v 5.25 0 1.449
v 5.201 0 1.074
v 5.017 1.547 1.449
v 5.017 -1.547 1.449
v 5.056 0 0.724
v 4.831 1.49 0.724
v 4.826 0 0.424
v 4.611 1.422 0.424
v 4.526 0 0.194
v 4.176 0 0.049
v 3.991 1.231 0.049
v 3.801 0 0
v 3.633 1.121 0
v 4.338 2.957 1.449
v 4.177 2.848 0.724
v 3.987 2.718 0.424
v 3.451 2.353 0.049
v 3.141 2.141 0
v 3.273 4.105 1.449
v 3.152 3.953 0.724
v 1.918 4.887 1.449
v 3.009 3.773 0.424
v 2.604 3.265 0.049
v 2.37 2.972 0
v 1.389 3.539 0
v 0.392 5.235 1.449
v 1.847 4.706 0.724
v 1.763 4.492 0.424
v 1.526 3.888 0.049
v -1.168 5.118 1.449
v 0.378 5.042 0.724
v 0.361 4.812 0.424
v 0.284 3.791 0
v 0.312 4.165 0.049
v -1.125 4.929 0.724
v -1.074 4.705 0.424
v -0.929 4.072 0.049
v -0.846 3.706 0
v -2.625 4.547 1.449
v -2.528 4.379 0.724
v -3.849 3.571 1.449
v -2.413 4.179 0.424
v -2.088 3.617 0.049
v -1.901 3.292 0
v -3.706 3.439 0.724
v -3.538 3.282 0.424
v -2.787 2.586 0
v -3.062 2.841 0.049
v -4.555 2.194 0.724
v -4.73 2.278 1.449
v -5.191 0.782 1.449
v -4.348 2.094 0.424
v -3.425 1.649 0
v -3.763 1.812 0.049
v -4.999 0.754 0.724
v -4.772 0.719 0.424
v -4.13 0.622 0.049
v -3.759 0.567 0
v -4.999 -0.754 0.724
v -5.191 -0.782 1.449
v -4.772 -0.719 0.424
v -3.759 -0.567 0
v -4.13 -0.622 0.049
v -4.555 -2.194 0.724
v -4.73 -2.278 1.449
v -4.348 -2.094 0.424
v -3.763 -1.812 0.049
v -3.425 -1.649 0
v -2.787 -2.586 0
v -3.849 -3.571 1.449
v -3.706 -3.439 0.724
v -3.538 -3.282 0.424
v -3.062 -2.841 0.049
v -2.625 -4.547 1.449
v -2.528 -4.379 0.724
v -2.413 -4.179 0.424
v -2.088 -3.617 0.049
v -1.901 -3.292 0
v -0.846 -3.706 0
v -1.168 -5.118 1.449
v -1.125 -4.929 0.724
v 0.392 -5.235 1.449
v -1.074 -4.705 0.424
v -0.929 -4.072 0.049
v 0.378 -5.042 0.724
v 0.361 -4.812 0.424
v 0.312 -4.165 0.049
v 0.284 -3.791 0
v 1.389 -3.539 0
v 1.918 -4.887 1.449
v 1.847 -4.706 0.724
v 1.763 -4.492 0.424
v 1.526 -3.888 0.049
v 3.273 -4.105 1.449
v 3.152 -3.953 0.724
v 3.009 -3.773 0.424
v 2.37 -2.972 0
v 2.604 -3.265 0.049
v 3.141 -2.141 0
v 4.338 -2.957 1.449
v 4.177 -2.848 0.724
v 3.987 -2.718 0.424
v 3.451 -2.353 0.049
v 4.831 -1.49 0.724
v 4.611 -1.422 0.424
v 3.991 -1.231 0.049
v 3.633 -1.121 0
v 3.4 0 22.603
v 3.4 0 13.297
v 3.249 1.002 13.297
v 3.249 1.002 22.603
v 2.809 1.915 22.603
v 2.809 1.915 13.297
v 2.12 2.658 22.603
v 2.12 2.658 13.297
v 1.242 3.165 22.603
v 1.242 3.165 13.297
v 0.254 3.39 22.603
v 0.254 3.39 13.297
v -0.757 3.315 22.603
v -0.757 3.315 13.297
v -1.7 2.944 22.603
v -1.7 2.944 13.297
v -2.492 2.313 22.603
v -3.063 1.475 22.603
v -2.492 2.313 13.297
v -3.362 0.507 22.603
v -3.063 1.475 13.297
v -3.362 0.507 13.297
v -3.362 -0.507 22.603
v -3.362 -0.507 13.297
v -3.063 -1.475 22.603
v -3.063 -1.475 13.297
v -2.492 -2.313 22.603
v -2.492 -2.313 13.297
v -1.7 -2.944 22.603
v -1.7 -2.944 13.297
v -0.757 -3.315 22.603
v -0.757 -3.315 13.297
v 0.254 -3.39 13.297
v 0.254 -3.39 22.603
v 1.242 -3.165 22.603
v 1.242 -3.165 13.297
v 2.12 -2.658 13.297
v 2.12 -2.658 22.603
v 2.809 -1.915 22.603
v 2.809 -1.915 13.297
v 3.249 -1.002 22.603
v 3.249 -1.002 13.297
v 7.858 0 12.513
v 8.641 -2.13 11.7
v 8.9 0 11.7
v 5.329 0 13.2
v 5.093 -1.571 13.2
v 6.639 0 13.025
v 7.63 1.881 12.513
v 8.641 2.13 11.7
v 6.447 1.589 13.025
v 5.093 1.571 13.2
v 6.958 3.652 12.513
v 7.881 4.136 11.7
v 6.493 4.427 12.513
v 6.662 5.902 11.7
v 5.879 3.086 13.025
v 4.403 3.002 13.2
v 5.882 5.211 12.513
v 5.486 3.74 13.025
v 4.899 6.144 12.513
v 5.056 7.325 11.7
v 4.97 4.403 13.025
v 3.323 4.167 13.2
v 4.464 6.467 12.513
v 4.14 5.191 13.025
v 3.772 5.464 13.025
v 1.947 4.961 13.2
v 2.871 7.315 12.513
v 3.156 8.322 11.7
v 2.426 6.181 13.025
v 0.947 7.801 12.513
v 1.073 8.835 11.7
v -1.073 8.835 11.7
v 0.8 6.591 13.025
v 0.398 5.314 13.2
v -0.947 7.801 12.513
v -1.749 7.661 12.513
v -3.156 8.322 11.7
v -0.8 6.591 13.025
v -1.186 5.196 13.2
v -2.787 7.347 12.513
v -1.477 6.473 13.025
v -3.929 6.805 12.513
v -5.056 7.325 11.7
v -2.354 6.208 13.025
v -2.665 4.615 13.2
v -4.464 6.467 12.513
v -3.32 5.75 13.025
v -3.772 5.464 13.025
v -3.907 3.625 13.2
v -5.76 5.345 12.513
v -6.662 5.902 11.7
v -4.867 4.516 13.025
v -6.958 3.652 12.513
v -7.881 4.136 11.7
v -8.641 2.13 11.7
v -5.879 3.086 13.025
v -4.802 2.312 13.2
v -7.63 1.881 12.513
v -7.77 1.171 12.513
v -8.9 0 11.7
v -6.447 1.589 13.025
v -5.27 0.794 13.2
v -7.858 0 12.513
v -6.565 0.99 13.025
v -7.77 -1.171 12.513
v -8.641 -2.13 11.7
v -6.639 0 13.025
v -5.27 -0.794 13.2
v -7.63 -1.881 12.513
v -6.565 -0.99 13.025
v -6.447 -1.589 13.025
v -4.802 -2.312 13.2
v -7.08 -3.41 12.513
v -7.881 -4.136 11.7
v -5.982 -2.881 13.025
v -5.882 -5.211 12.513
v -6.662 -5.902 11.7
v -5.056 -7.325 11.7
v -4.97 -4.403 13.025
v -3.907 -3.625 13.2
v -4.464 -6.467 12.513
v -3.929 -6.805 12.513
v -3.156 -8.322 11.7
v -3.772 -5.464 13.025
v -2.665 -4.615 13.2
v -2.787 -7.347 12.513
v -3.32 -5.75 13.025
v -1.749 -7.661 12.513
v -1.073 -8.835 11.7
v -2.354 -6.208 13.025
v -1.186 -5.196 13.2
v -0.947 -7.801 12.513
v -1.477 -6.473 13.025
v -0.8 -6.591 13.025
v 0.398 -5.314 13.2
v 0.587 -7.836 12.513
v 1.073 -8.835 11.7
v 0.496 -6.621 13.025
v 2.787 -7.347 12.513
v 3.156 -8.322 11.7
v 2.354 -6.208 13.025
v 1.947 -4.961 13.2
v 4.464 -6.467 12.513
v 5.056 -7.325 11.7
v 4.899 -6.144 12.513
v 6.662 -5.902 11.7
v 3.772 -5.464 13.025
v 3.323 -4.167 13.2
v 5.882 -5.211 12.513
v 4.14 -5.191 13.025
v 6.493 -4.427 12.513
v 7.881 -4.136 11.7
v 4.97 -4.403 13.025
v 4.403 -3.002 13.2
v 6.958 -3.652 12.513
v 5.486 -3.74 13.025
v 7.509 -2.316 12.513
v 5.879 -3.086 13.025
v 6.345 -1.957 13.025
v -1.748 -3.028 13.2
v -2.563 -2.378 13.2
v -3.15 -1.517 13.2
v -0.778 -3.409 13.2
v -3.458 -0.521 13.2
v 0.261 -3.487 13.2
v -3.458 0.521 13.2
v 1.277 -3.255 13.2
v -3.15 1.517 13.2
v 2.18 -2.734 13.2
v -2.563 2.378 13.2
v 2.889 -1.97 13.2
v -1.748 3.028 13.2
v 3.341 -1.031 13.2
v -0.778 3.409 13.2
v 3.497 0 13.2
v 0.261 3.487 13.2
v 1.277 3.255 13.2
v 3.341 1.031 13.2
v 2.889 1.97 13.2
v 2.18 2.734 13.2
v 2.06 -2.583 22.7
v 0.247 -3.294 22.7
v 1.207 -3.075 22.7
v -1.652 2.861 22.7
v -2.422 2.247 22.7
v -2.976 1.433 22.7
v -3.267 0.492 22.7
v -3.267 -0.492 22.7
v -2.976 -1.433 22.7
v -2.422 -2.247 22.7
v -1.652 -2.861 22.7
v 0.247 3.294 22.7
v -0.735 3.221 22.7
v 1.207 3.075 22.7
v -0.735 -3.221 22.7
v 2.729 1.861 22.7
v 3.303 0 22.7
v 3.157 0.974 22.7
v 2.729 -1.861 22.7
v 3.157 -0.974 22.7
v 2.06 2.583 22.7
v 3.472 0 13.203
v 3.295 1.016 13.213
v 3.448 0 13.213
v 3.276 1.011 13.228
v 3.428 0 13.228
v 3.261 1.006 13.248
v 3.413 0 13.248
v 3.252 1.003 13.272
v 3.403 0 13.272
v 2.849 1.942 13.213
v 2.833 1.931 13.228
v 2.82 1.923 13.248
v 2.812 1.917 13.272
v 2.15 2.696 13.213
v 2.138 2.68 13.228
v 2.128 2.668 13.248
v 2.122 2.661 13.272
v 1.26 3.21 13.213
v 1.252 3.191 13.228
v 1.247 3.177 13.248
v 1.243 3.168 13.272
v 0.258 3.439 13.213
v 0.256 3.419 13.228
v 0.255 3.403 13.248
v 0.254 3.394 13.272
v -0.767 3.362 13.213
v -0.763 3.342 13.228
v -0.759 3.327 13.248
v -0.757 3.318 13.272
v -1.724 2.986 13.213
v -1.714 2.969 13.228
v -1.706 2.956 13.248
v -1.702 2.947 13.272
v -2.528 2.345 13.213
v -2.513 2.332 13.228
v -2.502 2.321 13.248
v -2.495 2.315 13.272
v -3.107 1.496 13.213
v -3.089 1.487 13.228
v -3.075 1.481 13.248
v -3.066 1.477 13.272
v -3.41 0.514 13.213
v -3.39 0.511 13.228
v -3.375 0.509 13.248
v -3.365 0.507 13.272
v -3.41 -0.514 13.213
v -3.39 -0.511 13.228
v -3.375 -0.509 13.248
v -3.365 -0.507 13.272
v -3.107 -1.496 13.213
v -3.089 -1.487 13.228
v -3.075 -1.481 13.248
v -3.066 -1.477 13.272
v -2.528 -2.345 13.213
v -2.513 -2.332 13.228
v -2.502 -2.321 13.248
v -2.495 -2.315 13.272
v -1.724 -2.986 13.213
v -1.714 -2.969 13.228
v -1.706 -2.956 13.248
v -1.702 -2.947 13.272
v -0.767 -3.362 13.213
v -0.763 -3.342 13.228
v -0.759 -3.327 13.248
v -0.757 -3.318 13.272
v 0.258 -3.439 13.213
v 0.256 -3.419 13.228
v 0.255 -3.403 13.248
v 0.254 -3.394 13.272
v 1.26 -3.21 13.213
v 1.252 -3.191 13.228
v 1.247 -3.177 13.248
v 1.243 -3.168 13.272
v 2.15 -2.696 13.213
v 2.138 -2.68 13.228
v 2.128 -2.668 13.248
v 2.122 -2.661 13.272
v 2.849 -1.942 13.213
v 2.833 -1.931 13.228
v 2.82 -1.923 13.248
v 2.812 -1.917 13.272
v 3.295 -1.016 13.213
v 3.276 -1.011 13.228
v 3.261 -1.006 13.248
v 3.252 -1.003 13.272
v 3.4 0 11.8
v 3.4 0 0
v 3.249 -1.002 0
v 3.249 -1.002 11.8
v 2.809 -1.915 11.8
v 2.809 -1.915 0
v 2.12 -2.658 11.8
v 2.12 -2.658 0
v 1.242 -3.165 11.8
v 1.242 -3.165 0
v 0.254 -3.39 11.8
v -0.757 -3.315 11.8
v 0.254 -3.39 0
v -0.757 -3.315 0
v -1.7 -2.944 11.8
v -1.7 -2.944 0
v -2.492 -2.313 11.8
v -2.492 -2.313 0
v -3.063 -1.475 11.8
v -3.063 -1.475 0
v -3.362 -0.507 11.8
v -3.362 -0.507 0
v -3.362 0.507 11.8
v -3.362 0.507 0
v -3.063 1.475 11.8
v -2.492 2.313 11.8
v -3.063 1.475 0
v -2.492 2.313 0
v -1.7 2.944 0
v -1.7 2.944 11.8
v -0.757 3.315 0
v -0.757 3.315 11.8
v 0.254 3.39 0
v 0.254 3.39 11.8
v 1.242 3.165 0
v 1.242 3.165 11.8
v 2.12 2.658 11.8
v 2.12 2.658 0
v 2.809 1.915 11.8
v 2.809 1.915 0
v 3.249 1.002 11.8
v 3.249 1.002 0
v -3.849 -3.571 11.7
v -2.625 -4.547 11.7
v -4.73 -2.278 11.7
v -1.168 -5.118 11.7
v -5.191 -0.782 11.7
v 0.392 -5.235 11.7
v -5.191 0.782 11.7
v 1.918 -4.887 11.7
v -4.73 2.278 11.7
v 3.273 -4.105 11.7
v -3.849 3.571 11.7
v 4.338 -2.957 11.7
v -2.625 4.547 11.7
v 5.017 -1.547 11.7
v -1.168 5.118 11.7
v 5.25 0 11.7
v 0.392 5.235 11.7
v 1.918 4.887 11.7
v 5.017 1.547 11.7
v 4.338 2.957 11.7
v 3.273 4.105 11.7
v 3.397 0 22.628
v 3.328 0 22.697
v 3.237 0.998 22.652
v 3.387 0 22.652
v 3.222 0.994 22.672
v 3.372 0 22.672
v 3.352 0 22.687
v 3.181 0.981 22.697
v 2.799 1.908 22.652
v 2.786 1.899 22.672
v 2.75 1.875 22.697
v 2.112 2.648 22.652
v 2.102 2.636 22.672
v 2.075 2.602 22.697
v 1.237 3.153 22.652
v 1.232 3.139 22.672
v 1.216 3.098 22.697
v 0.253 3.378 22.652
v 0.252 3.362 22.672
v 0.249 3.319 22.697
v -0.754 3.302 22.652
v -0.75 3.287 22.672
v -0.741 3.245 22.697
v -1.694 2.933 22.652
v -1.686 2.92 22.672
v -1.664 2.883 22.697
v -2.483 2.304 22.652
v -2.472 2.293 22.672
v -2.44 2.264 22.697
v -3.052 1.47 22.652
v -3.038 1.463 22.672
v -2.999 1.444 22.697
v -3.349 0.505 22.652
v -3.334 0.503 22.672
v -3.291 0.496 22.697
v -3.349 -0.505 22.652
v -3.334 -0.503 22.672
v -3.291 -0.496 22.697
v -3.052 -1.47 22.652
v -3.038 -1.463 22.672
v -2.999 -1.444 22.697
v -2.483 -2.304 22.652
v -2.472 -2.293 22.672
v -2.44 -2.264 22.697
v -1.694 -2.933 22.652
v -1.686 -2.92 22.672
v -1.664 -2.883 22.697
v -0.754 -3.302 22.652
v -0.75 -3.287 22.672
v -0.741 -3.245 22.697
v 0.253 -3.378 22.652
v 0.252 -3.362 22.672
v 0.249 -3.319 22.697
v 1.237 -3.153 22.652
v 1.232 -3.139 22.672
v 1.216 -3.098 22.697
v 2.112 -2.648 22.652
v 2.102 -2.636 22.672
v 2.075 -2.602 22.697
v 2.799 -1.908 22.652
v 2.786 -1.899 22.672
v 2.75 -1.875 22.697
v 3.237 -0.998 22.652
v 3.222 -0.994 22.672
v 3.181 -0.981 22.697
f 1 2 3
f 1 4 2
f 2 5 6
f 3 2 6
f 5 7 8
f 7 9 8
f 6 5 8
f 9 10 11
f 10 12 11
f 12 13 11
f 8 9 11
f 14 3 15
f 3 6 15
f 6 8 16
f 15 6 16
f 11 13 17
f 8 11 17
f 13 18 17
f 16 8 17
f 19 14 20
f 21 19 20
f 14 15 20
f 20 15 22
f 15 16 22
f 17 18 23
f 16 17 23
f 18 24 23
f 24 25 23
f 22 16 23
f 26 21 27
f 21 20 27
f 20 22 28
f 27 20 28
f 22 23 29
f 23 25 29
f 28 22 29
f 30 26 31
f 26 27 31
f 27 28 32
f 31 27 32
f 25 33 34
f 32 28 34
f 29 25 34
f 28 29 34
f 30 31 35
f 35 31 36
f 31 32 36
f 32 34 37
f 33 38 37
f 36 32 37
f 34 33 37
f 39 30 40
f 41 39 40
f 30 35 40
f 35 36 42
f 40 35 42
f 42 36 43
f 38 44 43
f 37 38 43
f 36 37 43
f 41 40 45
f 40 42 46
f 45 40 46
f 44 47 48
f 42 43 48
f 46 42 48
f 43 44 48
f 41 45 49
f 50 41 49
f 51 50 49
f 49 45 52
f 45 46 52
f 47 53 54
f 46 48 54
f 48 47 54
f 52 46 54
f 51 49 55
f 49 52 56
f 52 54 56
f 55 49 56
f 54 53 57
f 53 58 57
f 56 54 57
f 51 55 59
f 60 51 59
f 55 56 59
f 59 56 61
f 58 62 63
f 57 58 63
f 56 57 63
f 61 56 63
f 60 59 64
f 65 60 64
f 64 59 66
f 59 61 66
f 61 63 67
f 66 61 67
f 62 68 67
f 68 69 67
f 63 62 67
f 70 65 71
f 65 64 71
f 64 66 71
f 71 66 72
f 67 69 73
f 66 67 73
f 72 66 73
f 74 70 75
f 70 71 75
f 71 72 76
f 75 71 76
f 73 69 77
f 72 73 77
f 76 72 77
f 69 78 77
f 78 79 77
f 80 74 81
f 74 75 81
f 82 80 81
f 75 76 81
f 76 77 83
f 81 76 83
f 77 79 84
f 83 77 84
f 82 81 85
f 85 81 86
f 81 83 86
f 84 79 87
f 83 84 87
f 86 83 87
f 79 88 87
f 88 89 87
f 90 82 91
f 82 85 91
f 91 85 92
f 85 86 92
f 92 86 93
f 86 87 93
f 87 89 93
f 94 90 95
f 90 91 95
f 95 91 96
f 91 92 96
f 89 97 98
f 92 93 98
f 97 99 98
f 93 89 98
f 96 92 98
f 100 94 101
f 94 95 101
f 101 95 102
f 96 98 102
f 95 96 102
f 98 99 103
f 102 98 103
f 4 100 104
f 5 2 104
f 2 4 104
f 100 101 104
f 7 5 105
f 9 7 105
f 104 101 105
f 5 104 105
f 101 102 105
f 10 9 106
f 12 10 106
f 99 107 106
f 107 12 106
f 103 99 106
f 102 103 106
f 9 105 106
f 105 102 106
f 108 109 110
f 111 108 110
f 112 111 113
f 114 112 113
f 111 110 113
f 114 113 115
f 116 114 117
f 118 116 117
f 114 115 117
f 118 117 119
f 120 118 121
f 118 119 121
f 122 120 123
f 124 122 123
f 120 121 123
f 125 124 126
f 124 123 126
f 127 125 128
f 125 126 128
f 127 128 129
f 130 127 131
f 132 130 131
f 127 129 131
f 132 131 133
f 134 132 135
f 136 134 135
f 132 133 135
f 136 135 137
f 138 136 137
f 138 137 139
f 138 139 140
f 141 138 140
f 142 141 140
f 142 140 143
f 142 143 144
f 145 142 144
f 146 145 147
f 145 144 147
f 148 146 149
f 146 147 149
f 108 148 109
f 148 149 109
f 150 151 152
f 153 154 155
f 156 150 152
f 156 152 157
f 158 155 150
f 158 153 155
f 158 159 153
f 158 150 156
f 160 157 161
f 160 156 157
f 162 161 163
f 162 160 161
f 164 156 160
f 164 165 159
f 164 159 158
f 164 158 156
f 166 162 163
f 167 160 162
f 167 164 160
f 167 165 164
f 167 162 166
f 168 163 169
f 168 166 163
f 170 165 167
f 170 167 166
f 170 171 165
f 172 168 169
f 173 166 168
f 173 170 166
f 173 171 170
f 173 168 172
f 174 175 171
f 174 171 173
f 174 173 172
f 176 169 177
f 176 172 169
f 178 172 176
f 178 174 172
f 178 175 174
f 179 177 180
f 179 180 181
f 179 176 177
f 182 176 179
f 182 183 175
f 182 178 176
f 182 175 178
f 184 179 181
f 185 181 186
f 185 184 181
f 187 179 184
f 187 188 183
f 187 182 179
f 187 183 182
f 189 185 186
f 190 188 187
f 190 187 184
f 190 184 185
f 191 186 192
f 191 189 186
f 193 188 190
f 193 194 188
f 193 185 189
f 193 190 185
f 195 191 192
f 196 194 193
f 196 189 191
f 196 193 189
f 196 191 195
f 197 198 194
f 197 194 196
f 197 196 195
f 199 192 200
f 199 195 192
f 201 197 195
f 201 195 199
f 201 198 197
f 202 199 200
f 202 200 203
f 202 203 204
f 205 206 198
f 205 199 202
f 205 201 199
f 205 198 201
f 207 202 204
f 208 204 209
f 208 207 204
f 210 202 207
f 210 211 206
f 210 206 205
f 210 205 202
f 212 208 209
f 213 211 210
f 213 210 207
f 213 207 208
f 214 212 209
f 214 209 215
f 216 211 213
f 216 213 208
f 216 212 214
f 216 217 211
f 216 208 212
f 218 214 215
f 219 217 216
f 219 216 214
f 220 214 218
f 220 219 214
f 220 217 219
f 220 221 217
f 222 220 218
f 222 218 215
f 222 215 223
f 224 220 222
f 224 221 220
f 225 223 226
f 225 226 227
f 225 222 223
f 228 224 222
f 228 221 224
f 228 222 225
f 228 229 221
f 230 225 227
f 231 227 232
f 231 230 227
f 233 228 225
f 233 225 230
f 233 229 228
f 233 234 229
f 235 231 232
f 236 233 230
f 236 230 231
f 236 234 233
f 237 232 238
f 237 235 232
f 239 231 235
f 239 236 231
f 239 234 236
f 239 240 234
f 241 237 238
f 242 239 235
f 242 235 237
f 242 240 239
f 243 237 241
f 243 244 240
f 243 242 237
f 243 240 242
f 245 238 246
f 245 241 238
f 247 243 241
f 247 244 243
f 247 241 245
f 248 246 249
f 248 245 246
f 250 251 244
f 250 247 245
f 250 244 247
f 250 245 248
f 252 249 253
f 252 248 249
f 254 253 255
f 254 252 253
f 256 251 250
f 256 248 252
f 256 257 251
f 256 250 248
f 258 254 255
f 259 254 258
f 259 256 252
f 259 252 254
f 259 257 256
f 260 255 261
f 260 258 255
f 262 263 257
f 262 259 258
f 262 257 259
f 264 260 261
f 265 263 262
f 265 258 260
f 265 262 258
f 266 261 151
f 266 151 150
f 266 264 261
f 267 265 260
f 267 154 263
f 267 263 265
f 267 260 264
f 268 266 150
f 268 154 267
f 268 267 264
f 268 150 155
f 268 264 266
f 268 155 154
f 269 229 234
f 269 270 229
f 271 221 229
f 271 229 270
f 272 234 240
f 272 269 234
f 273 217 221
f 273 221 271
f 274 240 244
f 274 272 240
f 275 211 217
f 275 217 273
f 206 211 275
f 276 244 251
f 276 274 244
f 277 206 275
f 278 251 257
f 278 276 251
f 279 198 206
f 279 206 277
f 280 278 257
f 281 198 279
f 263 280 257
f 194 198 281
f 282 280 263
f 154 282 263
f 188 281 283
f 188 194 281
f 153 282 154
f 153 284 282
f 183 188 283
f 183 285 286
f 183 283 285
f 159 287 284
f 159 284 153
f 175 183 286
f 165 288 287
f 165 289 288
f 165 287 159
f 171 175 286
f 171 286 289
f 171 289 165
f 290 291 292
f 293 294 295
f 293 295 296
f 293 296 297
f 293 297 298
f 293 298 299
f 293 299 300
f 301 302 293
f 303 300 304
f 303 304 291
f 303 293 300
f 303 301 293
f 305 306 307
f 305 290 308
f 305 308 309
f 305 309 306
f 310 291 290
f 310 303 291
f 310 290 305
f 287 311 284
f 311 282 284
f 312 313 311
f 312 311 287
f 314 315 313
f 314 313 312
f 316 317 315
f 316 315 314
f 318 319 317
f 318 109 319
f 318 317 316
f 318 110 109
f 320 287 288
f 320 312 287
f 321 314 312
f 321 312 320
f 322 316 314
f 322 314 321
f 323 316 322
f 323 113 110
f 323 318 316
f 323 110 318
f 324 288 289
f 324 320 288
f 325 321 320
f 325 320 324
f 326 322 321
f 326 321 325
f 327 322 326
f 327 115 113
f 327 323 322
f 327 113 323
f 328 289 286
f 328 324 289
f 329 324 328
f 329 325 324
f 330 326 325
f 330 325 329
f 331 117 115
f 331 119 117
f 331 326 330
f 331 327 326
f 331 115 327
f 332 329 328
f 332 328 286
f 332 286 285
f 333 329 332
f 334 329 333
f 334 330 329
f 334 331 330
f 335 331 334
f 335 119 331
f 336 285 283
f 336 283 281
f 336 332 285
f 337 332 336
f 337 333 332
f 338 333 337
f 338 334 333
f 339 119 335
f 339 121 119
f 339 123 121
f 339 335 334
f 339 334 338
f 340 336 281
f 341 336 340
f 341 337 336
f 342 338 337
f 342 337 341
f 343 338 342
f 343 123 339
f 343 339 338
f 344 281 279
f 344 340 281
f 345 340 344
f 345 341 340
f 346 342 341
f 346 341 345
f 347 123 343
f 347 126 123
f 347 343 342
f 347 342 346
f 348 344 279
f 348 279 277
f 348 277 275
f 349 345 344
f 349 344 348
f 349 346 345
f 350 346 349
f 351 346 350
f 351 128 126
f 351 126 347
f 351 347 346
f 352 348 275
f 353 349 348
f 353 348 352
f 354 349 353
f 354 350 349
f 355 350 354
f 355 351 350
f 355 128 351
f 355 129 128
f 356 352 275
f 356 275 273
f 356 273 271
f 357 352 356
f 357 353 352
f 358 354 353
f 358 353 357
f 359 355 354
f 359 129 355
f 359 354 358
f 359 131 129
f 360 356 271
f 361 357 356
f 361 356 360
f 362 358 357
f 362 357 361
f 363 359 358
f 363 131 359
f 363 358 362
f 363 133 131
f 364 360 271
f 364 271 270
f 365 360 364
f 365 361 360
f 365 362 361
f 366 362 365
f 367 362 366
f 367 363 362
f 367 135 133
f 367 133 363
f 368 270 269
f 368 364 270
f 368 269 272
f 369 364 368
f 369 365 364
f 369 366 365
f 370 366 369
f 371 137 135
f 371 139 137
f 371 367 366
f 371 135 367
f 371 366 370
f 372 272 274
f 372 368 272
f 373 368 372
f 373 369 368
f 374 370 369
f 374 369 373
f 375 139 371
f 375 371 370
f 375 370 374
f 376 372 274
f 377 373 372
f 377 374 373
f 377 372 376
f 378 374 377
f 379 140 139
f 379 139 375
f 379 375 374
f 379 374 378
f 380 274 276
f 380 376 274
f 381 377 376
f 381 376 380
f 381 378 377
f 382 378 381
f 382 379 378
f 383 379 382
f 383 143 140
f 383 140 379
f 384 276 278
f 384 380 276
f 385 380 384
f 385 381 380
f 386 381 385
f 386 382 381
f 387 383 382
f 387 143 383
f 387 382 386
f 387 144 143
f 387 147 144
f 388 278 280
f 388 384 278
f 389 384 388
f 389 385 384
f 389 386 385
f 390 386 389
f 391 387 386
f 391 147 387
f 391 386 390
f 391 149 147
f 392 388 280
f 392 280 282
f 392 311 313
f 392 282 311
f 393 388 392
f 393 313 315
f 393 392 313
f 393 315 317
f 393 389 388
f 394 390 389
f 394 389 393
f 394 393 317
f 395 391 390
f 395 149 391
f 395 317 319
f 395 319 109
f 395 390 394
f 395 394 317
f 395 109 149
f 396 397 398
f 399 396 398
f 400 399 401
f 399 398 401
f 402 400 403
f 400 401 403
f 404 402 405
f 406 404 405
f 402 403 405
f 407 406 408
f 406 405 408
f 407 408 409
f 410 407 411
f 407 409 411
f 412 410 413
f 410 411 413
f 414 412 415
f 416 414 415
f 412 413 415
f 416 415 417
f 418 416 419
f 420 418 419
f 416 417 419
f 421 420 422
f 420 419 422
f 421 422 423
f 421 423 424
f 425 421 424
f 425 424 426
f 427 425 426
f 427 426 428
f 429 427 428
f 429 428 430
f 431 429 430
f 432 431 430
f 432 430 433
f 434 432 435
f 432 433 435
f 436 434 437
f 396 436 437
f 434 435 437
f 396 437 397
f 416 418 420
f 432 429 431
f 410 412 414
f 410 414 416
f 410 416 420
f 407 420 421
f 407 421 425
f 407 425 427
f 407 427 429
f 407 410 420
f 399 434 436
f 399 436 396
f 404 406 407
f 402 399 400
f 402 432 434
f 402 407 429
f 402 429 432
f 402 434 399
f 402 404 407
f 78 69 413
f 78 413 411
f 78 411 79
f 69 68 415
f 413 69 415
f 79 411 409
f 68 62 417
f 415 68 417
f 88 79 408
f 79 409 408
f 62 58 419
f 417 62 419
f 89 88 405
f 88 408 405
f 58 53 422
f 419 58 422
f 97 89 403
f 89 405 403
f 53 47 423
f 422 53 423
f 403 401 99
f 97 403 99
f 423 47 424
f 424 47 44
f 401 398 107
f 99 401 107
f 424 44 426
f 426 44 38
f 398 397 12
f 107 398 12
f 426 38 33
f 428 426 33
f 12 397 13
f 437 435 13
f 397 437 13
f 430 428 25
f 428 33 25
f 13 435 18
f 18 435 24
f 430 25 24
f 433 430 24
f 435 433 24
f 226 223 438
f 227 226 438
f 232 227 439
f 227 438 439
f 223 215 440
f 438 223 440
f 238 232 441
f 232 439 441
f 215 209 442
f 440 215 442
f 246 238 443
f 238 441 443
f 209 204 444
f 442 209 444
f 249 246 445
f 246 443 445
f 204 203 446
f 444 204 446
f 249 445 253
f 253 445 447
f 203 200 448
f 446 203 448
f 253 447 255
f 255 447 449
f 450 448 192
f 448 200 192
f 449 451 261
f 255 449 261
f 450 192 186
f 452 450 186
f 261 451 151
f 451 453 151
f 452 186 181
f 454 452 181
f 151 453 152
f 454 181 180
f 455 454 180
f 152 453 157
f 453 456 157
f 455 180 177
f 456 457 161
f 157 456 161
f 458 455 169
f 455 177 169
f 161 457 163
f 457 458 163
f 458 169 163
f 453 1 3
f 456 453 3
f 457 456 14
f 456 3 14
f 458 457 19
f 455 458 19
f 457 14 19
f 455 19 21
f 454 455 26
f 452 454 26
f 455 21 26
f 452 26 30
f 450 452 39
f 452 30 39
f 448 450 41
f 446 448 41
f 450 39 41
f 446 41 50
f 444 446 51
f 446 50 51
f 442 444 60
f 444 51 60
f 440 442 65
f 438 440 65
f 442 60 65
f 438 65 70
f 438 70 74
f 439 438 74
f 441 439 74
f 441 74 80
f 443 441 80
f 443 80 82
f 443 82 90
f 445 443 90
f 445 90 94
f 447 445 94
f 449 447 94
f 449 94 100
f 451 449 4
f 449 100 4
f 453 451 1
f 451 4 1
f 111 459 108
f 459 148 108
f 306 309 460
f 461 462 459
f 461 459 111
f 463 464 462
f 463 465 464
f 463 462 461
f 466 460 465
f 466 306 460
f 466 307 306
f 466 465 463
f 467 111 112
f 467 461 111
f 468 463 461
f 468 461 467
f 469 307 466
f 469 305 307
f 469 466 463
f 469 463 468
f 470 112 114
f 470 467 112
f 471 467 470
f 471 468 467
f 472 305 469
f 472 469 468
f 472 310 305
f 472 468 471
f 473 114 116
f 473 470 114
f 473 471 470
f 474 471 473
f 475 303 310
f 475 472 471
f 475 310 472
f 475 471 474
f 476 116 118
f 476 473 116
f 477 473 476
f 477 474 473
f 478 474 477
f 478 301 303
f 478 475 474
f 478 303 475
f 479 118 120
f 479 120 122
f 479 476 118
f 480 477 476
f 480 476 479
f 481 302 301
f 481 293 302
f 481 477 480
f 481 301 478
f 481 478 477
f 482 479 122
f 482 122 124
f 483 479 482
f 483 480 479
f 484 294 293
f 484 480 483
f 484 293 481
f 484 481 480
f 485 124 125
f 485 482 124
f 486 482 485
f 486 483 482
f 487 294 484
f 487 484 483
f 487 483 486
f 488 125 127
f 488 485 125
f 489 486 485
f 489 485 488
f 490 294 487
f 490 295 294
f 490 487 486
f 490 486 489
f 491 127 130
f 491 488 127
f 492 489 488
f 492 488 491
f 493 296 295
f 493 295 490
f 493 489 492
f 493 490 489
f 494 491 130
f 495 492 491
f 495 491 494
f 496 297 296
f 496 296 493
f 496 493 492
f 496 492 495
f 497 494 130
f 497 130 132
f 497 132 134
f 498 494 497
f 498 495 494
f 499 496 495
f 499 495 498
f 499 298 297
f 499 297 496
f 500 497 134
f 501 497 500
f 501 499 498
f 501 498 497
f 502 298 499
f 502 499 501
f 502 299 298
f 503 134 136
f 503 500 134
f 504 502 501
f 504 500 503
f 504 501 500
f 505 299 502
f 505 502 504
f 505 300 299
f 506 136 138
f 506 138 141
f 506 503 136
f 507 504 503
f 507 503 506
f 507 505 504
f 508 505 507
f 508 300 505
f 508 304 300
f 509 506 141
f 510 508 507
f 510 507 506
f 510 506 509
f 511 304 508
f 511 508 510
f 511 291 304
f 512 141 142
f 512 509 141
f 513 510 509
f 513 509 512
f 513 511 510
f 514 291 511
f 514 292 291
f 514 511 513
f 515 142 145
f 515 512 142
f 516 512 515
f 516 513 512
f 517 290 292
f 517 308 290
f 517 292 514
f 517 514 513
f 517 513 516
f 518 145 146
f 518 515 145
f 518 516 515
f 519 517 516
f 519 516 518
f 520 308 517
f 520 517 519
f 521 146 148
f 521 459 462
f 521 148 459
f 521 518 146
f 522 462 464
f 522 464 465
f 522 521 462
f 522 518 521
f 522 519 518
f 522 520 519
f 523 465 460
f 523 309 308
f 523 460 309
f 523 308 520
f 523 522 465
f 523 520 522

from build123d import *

# Parameters (mm, degrees)
F0_R     = 5.25
F1_DEPTH = 11.7
F2_R     = 8.9
F3_DEPTH = 1.5
F4_R     = 3.4
F5_DEPTH = 9.5
F7_R     = 0.0965685425
F8_R     = 3.4
F9_DEPTH = 11.8
F10_R    = 1.4485281374


# Not quite as in the source:
# - a fillet or chamfer that OpenCascade refuses, or shapes differently, is made with other operations: its cross-section is extruded or revolved along the edge and cut away or added


with BuildPart() as f1:
    # F0 (on Top) → F1 (new body)
    with BuildSketch(Plane.XY):
        Circle(F0_R)
    extrude(amount=F1_DEPTH)

    # F2 (on face) → F3 (join)
    with BuildSketch(Plane.XY.offset(11.7)):
        Circle(F2_R)
    extrude(amount=F3_DEPTH)

    # F4 (on face) → F5 (join)
    with BuildSketch(Plane.XY.offset(13.2)):
        Circle(F4_R)
    extrude(amount=F5_DEPTH)

    # F6: fillet of radius 5 on 1 edges, made by hand

    # F6_s1 → F6_t2 (revolve, cut)
    with BuildSketch(Plane.XZ):
        with BuildLine():
            ThreePointArc((8.9, 11.7), (7.2657774588, 12.8097722286), (5.3292857857, 13.2))
            Line((5.3292857857, 13.2), (8.9, 13.2))
            Line((8.9, 13.2), (8.9, 11.7))
        make_face()
    revolve(axis=Axis((0, 0, 13.2), (0, 0, 1)), mode=Mode.SUBTRACT)

    # F7
    f7_edges = [f1.edges().sort_by_distance(p)[0] for p in [
        (3.4, 0, 17.95),
        (-3.4, 0, 13.2),
        (-3.4, 0, 22.7),
    ]]
    fillet(f7_edges, radius=F7_R)

    # F8 (on face) → F9 (cut)
    with BuildSketch(Plane(origin=(0, 0, 0), x_dir=(1, 0, 0), z_dir=(0, 0, -1))):
        Circle(F8_R)
    extrude(amount=-F9_DEPTH, mode=Mode.SUBTRACT)

    # F10
    f10_edges = [f1.edges().sort_by_distance(p)[0] for p in [
        (-5.25, 0, 0),
    ]]
    fillet(f10_edges, radius=F10_R)


solid = f1.part
